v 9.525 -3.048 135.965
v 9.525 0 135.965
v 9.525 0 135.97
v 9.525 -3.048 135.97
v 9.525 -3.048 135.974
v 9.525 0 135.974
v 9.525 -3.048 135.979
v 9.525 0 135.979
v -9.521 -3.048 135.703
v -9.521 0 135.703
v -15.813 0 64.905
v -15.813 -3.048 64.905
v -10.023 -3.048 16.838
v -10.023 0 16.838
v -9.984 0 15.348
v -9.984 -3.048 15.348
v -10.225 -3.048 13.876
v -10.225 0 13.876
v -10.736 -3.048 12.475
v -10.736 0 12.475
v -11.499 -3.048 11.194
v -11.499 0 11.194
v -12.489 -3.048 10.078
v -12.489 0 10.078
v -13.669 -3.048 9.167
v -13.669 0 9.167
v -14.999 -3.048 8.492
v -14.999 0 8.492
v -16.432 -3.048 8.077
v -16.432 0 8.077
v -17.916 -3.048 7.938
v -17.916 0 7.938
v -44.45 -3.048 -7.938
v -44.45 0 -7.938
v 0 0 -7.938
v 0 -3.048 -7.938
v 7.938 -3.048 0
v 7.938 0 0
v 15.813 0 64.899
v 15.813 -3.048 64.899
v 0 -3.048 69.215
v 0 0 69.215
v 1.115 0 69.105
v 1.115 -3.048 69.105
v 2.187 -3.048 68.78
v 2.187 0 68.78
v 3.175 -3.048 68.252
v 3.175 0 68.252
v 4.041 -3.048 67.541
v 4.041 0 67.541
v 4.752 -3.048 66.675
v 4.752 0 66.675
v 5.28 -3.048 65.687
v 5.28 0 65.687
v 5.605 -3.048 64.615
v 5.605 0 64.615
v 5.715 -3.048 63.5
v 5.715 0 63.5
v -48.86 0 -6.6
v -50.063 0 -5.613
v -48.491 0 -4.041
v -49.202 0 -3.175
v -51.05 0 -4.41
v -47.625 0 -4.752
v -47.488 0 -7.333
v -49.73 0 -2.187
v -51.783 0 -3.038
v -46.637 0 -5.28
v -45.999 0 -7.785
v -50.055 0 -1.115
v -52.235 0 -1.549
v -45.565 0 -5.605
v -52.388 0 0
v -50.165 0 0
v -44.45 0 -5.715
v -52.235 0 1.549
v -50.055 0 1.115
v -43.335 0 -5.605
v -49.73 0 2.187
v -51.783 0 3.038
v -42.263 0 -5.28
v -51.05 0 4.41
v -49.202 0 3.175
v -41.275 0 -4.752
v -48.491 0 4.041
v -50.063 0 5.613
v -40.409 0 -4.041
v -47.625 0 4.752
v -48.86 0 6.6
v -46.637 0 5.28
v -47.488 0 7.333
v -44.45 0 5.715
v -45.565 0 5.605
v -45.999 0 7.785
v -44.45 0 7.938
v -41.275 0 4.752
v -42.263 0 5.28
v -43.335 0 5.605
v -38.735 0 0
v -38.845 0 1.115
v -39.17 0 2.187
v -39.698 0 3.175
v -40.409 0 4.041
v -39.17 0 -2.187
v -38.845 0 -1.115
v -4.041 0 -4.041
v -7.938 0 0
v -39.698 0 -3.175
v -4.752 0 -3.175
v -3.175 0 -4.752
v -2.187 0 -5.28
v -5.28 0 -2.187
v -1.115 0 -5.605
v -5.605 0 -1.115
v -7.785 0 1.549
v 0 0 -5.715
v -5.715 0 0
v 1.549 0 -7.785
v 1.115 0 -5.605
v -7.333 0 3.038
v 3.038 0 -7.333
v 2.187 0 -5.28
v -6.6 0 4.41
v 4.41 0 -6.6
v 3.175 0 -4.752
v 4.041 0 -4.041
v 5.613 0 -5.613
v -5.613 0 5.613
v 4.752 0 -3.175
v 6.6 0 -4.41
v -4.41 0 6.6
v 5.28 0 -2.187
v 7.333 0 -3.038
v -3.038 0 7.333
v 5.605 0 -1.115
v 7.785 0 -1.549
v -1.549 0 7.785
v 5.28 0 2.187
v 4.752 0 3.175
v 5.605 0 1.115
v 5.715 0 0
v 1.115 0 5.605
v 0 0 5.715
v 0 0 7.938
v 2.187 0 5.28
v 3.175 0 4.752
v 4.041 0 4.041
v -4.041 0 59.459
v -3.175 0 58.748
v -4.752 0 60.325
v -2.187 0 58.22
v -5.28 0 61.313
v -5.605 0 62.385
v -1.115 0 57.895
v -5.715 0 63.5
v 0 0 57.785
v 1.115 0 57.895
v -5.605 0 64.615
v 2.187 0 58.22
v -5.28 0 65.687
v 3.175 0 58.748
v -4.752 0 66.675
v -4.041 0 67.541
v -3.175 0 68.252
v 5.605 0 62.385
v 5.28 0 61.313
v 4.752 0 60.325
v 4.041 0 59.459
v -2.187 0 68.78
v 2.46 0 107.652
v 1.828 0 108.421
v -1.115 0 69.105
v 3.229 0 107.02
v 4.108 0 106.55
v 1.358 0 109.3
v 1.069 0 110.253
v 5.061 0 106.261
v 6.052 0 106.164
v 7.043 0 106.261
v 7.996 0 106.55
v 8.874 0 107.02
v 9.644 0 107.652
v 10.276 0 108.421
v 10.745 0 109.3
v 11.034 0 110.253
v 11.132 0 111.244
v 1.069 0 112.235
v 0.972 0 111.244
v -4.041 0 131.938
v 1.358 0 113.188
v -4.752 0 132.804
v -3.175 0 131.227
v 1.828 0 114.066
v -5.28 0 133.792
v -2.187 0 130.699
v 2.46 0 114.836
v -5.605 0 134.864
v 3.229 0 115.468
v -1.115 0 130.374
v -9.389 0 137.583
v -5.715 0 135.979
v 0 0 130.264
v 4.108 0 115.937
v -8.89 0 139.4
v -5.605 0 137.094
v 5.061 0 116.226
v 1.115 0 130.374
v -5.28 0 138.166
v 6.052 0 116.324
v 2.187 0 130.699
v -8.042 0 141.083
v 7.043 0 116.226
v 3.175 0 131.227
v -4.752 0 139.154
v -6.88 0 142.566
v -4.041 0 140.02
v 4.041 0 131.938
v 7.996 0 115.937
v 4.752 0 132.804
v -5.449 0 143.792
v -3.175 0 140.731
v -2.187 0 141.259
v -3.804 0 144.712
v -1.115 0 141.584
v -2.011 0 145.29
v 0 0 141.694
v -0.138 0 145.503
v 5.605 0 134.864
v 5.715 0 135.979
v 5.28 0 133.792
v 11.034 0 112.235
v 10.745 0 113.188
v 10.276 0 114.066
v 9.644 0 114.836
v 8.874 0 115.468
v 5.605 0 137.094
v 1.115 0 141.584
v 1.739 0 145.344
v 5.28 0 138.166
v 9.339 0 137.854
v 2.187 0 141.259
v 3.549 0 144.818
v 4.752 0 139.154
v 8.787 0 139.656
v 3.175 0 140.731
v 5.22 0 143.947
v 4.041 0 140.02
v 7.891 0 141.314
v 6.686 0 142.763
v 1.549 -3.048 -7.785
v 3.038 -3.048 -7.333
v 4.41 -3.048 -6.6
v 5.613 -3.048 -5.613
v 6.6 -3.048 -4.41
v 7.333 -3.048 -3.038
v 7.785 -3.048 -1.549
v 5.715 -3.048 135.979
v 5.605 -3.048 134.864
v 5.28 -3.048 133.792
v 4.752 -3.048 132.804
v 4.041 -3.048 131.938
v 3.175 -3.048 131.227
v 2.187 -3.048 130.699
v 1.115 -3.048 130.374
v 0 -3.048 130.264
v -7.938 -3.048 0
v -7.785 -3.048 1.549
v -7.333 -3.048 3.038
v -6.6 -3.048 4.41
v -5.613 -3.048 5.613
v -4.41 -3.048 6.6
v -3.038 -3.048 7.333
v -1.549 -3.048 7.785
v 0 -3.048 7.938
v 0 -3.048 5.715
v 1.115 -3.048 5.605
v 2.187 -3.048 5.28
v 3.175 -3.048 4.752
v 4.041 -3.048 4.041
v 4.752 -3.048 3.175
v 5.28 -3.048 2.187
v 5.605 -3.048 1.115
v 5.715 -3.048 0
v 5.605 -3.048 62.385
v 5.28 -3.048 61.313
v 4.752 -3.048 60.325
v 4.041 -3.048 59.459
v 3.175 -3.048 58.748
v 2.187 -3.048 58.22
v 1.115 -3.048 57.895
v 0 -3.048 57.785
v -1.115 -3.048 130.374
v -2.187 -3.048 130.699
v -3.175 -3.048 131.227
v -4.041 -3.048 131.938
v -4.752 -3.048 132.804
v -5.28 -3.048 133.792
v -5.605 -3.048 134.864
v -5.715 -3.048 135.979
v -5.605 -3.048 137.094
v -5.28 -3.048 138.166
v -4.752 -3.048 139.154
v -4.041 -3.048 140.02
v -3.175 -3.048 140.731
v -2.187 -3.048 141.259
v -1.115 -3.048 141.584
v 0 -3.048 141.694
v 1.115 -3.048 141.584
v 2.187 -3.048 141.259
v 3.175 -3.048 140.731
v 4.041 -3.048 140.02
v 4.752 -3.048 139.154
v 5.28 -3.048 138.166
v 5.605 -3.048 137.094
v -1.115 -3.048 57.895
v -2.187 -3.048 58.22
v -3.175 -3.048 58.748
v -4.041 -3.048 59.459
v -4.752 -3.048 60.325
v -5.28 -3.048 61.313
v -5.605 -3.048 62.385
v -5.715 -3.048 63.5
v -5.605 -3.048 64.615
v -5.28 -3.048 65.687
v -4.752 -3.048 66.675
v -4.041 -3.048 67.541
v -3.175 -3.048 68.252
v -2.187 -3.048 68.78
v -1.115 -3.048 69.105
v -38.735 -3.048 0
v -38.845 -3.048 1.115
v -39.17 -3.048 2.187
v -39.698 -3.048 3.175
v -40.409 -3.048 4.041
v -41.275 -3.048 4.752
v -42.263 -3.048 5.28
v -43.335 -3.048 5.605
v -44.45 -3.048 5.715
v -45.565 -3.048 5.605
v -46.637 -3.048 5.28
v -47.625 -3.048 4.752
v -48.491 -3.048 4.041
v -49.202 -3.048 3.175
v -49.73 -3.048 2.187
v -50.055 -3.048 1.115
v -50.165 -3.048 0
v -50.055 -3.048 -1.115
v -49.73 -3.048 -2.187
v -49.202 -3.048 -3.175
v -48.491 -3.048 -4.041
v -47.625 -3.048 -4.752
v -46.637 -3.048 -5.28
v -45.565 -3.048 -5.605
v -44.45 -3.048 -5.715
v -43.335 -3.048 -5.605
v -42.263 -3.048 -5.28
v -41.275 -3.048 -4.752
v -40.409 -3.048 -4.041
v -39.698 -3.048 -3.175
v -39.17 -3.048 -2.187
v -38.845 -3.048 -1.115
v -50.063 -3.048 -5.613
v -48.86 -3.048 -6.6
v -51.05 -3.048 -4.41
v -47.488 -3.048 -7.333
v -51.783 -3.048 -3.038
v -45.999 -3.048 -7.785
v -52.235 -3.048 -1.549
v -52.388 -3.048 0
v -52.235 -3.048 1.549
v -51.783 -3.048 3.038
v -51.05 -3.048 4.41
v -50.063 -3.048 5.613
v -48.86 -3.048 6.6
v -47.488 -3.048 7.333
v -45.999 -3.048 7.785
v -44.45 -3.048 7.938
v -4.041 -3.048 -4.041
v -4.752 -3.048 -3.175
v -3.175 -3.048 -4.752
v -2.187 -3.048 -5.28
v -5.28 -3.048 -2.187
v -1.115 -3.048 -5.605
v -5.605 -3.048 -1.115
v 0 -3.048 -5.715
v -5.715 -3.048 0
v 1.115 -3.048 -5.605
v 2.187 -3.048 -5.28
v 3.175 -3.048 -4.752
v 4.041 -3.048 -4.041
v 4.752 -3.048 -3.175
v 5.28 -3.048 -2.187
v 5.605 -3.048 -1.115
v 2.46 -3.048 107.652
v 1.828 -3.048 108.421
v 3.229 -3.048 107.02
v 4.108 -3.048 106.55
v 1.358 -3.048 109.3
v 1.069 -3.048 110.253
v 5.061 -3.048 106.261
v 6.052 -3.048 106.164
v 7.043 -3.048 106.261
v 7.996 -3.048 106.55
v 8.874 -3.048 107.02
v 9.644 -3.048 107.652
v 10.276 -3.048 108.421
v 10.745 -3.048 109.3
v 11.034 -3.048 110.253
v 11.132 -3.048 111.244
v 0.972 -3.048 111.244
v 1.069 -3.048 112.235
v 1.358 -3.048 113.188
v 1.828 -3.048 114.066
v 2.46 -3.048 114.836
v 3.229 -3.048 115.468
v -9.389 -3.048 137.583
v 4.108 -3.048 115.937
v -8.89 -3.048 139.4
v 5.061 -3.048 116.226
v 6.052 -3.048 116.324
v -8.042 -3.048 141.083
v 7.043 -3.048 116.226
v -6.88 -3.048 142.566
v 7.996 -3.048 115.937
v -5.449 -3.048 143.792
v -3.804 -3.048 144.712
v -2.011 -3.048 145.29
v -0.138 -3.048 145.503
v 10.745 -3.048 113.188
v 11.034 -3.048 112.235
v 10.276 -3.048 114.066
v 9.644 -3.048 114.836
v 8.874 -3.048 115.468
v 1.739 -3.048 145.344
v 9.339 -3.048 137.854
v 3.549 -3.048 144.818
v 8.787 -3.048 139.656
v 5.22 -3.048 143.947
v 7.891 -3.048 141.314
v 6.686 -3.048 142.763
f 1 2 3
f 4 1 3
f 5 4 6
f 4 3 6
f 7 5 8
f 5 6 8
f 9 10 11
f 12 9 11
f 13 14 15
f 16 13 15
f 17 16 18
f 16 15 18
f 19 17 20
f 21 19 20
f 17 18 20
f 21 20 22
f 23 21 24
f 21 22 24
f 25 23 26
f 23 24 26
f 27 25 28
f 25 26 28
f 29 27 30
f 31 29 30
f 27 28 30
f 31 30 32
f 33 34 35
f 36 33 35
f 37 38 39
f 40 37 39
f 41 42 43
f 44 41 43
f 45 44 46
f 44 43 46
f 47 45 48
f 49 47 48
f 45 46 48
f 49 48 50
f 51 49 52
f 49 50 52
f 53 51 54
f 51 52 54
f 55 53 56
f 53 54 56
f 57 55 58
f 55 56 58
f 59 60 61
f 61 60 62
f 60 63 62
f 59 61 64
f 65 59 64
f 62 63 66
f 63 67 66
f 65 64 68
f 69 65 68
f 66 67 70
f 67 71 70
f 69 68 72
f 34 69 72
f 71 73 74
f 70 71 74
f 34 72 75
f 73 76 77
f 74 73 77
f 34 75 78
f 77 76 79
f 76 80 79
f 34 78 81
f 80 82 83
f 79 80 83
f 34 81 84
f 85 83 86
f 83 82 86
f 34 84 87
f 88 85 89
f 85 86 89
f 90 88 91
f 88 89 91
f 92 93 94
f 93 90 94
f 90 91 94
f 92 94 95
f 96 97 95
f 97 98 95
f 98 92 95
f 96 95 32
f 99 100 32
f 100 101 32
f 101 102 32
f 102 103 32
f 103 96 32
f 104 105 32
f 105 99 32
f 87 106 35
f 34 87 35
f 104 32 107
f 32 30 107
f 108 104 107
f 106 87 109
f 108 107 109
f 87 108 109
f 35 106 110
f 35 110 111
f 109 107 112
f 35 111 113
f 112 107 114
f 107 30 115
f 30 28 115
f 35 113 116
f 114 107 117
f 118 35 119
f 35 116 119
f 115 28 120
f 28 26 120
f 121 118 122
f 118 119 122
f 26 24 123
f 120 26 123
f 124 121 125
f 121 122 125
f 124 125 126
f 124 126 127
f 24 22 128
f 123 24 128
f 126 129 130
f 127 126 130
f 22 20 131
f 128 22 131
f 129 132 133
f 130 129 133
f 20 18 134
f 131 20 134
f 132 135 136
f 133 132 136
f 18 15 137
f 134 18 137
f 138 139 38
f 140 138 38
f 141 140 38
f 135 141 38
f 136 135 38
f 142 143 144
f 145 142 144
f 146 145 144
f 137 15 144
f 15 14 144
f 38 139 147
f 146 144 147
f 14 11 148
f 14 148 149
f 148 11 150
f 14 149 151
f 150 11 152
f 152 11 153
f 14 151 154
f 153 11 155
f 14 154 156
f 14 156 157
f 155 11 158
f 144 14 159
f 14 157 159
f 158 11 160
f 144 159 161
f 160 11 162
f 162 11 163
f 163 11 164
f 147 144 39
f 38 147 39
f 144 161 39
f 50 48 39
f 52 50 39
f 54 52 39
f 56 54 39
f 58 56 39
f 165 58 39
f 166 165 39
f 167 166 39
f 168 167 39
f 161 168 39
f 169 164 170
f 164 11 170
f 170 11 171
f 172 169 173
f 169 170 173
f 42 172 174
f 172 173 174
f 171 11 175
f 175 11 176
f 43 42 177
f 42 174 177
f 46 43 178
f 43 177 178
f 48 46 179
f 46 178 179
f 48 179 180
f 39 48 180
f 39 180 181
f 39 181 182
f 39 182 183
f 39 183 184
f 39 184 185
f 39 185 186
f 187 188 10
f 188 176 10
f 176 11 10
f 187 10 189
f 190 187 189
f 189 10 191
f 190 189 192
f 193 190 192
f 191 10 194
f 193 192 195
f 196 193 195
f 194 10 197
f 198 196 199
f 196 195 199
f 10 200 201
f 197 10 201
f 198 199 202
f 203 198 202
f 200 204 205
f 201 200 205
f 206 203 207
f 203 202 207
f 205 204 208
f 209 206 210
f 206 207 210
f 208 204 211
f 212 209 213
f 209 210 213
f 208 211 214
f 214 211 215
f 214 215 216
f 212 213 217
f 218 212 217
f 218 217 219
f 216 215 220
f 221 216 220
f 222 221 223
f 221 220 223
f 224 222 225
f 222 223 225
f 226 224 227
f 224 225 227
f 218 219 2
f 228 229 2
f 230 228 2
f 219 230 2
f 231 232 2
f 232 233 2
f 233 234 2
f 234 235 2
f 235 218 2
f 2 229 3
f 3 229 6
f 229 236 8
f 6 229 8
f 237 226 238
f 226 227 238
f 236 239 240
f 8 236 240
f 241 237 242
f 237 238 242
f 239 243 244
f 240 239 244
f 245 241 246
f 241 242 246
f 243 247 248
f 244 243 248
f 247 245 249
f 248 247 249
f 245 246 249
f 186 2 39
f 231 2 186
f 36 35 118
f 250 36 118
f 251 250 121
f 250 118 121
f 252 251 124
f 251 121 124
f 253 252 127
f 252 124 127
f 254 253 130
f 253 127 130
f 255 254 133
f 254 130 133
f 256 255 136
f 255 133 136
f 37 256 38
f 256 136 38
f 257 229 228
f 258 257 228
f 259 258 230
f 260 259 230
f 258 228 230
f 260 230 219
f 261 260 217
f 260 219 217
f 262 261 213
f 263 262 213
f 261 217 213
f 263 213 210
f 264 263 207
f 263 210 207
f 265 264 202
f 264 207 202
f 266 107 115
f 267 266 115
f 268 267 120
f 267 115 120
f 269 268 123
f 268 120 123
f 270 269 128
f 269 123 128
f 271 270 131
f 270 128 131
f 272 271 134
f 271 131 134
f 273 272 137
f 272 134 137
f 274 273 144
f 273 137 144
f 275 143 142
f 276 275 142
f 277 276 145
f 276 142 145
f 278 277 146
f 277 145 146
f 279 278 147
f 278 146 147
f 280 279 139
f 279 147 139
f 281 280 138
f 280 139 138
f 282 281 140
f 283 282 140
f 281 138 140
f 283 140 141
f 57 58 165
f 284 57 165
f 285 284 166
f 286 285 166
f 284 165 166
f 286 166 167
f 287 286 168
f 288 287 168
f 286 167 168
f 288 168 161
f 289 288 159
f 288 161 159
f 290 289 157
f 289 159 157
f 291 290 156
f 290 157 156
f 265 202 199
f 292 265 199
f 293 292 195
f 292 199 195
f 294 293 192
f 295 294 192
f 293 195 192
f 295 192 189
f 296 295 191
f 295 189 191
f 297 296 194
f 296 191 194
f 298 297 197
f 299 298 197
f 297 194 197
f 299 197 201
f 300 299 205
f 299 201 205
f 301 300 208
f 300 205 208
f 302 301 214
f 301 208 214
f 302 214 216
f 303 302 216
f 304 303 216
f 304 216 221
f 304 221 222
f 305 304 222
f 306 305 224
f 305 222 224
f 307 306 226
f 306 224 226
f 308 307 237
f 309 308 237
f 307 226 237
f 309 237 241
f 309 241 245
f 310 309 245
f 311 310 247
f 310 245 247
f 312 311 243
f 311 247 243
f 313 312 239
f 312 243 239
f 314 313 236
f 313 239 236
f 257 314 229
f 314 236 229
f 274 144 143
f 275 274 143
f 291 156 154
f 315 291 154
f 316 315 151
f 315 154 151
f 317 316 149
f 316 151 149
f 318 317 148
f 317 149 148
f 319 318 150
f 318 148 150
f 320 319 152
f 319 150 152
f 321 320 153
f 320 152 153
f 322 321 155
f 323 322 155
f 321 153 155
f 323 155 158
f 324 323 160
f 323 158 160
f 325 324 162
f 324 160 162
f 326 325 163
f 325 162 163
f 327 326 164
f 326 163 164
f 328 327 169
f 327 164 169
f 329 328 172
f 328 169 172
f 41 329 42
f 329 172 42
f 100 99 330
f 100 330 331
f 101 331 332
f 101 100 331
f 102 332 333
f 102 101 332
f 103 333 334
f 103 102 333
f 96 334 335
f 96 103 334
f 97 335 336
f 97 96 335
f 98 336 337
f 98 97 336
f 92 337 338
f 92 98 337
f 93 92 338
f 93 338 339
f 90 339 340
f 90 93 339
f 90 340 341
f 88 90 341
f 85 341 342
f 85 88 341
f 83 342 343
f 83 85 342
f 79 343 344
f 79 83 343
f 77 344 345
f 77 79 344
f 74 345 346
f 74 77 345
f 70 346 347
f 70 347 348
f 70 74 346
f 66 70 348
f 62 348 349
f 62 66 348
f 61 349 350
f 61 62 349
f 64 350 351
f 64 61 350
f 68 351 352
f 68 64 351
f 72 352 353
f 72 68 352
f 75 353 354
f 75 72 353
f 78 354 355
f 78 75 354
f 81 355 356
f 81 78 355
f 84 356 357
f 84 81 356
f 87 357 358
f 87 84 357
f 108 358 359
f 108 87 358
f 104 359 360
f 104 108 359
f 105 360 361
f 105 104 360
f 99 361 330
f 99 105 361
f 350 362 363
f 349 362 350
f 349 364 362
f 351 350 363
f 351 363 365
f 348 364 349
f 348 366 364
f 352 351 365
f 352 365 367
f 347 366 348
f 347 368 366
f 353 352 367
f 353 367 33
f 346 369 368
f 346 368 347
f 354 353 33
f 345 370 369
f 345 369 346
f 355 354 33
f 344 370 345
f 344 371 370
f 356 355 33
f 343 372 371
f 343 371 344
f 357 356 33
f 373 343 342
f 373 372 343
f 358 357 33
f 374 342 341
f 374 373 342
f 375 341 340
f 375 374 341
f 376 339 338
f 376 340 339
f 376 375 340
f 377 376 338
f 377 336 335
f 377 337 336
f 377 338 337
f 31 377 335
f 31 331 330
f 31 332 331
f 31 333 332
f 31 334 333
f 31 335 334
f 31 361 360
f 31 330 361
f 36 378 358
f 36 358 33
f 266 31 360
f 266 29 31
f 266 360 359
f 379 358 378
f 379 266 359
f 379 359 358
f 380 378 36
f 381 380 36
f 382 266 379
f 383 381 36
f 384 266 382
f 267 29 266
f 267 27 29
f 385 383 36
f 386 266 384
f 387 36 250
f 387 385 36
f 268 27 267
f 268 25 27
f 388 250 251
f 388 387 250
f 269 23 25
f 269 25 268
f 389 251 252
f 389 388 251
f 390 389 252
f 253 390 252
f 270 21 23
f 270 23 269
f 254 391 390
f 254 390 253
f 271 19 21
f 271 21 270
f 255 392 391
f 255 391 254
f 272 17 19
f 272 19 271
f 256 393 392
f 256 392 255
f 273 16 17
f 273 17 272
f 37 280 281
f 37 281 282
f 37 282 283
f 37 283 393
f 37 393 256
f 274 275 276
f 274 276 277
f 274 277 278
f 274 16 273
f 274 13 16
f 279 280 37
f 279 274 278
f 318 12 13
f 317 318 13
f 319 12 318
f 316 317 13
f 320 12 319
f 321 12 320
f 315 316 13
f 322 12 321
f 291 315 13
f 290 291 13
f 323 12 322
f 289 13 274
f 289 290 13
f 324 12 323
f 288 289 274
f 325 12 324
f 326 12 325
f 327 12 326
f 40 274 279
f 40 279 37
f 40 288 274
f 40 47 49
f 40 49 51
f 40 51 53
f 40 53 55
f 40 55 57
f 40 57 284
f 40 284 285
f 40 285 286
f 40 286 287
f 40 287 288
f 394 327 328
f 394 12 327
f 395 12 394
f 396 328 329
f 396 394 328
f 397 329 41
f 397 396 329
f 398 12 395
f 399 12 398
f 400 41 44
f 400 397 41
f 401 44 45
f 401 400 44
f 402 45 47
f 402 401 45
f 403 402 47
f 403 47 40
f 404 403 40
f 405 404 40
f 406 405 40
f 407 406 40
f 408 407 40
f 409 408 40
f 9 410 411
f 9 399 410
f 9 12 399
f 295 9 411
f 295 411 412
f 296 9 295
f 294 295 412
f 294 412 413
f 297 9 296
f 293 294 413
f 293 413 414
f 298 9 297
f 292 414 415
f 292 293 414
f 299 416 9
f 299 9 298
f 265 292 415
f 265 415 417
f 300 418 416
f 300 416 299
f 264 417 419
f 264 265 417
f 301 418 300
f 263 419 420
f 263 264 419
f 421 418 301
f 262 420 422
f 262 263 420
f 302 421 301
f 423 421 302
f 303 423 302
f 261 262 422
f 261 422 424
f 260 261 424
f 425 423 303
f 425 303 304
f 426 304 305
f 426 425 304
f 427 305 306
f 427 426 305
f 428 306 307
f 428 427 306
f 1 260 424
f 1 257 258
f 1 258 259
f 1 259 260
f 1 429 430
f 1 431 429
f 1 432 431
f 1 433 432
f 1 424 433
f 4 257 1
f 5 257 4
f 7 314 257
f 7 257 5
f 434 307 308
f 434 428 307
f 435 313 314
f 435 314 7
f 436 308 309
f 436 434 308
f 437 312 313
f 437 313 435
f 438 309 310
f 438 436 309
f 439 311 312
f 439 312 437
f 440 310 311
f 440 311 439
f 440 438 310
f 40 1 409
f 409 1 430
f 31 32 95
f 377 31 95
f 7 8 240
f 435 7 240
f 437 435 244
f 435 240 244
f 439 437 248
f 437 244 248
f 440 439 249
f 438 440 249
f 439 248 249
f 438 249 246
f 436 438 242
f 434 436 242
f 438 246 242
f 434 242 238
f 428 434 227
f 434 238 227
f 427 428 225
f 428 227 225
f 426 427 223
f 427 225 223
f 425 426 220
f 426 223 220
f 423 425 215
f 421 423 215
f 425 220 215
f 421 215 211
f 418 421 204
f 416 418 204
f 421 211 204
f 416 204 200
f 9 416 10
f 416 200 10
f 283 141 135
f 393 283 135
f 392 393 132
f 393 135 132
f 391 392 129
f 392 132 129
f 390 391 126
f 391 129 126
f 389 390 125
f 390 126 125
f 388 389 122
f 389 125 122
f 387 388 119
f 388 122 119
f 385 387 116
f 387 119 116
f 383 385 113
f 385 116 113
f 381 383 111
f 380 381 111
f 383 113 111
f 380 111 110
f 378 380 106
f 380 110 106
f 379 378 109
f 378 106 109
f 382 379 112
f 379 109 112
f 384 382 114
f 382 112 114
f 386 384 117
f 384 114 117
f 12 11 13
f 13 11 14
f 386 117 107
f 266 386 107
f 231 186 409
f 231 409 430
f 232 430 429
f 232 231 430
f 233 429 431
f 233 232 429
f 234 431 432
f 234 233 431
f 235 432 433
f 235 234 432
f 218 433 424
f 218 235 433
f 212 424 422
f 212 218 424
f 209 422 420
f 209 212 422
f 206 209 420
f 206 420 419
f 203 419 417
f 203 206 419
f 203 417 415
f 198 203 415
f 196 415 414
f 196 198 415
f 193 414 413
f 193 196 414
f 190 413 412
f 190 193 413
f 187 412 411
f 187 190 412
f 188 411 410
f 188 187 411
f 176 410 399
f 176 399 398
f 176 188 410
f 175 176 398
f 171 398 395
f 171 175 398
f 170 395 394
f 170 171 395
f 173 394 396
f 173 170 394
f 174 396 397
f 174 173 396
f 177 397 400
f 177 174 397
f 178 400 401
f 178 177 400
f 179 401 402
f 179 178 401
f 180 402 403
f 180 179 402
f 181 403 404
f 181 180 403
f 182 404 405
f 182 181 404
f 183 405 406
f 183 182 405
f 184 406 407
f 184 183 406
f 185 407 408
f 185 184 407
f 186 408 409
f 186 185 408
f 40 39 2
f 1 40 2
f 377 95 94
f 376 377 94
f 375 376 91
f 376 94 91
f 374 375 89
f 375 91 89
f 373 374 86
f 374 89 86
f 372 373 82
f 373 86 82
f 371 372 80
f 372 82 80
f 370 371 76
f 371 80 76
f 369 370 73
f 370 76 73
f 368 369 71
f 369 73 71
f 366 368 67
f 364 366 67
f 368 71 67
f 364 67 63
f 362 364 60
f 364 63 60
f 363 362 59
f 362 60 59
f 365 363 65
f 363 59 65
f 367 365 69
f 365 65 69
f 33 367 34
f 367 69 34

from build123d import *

# Parameters (mm, degrees)
F0_R     = 5.08
F0_R_2   = 5.715
F1_DEPTH = 3.048


# Not quite as in the source:
# - a feature of the source that left no trace in its solid (it failed there, or was rolled back) is left out


with BuildPart() as f1:
    # F0 (on Front) → F1 (new body)
    with BuildSketch(Plane.XZ):
        with BuildLine():
            ThreePointArc((0, 57.785), (-5.715, 63.5), (0, 69.215))
            Line((0, 69.215), (0, 126.4542473564))
            ThreePointArc((0, 126.4542473564), (-6.6367069731, 129.1469896364), (-9.5209852919, 135.7027259805))
            Line((-9.5209852919, 135.7027259805), (-15.8126809955, 64.9052561096))
            Line((-15.8126809955, 64.9052561096), (-10.0230526485, 16.8384262865))
            ThreePointArc((-10.0230526485, 16.8384262865), (-11.9679184287, 10.6128911922), (-17.9162015492, 7.9375))
            Line((-17.9162015492, 7.9375), (-44.45, 7.9375))
            ThreePointArc((-44.45, 7.9375), (-38.8373399243, 5.6126600757), (-36.5125, 0))
            Line((-36.5125, 0), (-7.9375, 0))
            ThreePointArc((-7.9375, 0), (-5.6126600757, 5.6126600757), (0, 7.9375))
            Line((0, 7.9375), (0, 57.785))
        make_face()
        with BuildLine():
            Line((0, 126.4542473564), (0, 69.215))
            ThreePointArc((0, 69.215), (4.0411152545, 67.5411152545), (5.715, 63.5))
            ThreePointArc((5.715, 63.5), (4.0411152545, 59.4588847455), (0, 57.785))
            Line((0, 57.785), (0, 7.9375))
            ThreePointArc((0, 7.9375), (5.6126600757, 5.6126600757), (7.9375, 0))
            Line((7.9375, 0), (15.8132155809, 64.8992276415))
            Line((15.8132155809, 64.8992276415), (9.5249892223, 135.9649185116))
            ThreePointArc((9.5249892223, 135.9649185116), (6.7301241724, 129.2389911578), (0, 126.4542473564))
        make_face()
        with Locations((6.0517773964, 111.243724823)):
            Circle(F0_R, mode=Mode.SUBTRACT)
        with BuildLine():
            ThreePointArc((-9.5209852919, 135.7027259805), (-6.6367069731, 129.1469896364), (0, 126.4542473564))
            ThreePointArc((0, 126.4542473564), (6.7301241724, 129.2389911578), (9.5249892223, 135.9649185116))
            ThreePointArc((9.5249892223, 135.9649185116), (9.5249973056, 135.972082932), (9.525, 135.9792473564))
            ThreePointArc((9.525, 135.9792473564), (-0.1382752592, 145.5032436265), (-9.5209852919, 135.7027259805))
        make_face()
        with BuildLine():
            ThreePointArc((5.715, 135.9792473564), (4.0411152545, 131.9381321019), (0, 130.2642473564))
            ThreePointArc((0, 130.2642473564), (-4.0411152545, 140.0203626109), (5.715, 135.9792473564))
        make_face(mode=Mode.SUBTRACT)
        with BuildLine():
            ThreePointArc((7.9375, 0), (5.6126600757, 5.6126600757), (0, 7.9375))
            Line((0, 7.9375), (0, 5.715))
            ThreePointArc((0, 5.715), (4.0411152545, 4.0411152545), (5.715, 0))
            ThreePointArc((5.715, 0), (0, -5.715), (-5.715, 0))
            Line((-5.715, 0), (-7.9375, 0))
            ThreePointArc((-7.9375, 0), (-5.6126600757, -5.6126600757), (0, -7.9375))
            ThreePointArc((0, -7.9375), (5.6126600757, -5.6126600757), (7.9375, 0))
        make_face()
        with BuildLine():
            ThreePointArc((0, -7.9375), (-5.6126600757, -5.6126600757), (-7.9375, 0))
            Line((-7.9375, 0), (-36.5125, 0))
            ThreePointArc((-36.5125, 0), (-38.8373399243, -5.6126600757), (-44.45, -7.9375))
            Line((-44.45, -7.9375), (0, -7.9375))
        make_face()
        with BuildLine():
            ThreePointArc((-44.45, -7.9375), (-38.8373399243, -5.6126600757), (-36.5125, 0))
            ThreePointArc((-36.5125, 0), (-38.8373399243, 5.6126600757), (-44.45, 7.9375))
            ThreePointArc((-44.45, 7.9375), (-52.3875, 0), (-44.45, -7.9375))
        make_face()
        with Locations((-44.45, 0)):
            Circle(F0_R_2, mode=Mode.SUBTRACT)
    extrude(amount=F1_DEPTH)


solid = f1.part
